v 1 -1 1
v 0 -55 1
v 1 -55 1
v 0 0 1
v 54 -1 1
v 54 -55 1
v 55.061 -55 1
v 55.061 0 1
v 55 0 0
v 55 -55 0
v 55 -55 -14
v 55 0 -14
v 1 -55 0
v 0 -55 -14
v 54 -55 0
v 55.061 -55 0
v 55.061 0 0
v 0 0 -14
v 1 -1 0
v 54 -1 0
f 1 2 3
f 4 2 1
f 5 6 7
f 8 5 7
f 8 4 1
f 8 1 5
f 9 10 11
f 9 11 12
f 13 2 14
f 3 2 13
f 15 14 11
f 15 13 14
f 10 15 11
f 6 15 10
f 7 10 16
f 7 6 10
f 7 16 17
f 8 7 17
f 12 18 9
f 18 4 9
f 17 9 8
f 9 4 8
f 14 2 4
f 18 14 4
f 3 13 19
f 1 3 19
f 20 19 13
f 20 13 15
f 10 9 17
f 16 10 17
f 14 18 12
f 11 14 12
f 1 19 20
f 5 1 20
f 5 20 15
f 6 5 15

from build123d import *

# Parameters (mm, degrees)
F2_DEPTH = 1
F0_W     = 55
F0_H     = 55
F3_DEPTH = 14


with BuildPart() as f2:
    # F1 (on face) → F2 (new body)
    with BuildSketch(Plane.XY):
        Polygon((1, -1), (54, -1), (54, -55), (55.060755, -55), (55.060755, 0), (0, 0), (0, -55), (1, -55), align=None)
    extrude(amount=F2_DEPTH)

    # F0 (on Top) → F3 (join)
    with BuildSketch(Plane.XY):
        with Locations((27.5, -27.5)):
            Rectangle(F0_W, F0_H)
    extrude(amount=-F3_DEPTH)


solid = f2.part
